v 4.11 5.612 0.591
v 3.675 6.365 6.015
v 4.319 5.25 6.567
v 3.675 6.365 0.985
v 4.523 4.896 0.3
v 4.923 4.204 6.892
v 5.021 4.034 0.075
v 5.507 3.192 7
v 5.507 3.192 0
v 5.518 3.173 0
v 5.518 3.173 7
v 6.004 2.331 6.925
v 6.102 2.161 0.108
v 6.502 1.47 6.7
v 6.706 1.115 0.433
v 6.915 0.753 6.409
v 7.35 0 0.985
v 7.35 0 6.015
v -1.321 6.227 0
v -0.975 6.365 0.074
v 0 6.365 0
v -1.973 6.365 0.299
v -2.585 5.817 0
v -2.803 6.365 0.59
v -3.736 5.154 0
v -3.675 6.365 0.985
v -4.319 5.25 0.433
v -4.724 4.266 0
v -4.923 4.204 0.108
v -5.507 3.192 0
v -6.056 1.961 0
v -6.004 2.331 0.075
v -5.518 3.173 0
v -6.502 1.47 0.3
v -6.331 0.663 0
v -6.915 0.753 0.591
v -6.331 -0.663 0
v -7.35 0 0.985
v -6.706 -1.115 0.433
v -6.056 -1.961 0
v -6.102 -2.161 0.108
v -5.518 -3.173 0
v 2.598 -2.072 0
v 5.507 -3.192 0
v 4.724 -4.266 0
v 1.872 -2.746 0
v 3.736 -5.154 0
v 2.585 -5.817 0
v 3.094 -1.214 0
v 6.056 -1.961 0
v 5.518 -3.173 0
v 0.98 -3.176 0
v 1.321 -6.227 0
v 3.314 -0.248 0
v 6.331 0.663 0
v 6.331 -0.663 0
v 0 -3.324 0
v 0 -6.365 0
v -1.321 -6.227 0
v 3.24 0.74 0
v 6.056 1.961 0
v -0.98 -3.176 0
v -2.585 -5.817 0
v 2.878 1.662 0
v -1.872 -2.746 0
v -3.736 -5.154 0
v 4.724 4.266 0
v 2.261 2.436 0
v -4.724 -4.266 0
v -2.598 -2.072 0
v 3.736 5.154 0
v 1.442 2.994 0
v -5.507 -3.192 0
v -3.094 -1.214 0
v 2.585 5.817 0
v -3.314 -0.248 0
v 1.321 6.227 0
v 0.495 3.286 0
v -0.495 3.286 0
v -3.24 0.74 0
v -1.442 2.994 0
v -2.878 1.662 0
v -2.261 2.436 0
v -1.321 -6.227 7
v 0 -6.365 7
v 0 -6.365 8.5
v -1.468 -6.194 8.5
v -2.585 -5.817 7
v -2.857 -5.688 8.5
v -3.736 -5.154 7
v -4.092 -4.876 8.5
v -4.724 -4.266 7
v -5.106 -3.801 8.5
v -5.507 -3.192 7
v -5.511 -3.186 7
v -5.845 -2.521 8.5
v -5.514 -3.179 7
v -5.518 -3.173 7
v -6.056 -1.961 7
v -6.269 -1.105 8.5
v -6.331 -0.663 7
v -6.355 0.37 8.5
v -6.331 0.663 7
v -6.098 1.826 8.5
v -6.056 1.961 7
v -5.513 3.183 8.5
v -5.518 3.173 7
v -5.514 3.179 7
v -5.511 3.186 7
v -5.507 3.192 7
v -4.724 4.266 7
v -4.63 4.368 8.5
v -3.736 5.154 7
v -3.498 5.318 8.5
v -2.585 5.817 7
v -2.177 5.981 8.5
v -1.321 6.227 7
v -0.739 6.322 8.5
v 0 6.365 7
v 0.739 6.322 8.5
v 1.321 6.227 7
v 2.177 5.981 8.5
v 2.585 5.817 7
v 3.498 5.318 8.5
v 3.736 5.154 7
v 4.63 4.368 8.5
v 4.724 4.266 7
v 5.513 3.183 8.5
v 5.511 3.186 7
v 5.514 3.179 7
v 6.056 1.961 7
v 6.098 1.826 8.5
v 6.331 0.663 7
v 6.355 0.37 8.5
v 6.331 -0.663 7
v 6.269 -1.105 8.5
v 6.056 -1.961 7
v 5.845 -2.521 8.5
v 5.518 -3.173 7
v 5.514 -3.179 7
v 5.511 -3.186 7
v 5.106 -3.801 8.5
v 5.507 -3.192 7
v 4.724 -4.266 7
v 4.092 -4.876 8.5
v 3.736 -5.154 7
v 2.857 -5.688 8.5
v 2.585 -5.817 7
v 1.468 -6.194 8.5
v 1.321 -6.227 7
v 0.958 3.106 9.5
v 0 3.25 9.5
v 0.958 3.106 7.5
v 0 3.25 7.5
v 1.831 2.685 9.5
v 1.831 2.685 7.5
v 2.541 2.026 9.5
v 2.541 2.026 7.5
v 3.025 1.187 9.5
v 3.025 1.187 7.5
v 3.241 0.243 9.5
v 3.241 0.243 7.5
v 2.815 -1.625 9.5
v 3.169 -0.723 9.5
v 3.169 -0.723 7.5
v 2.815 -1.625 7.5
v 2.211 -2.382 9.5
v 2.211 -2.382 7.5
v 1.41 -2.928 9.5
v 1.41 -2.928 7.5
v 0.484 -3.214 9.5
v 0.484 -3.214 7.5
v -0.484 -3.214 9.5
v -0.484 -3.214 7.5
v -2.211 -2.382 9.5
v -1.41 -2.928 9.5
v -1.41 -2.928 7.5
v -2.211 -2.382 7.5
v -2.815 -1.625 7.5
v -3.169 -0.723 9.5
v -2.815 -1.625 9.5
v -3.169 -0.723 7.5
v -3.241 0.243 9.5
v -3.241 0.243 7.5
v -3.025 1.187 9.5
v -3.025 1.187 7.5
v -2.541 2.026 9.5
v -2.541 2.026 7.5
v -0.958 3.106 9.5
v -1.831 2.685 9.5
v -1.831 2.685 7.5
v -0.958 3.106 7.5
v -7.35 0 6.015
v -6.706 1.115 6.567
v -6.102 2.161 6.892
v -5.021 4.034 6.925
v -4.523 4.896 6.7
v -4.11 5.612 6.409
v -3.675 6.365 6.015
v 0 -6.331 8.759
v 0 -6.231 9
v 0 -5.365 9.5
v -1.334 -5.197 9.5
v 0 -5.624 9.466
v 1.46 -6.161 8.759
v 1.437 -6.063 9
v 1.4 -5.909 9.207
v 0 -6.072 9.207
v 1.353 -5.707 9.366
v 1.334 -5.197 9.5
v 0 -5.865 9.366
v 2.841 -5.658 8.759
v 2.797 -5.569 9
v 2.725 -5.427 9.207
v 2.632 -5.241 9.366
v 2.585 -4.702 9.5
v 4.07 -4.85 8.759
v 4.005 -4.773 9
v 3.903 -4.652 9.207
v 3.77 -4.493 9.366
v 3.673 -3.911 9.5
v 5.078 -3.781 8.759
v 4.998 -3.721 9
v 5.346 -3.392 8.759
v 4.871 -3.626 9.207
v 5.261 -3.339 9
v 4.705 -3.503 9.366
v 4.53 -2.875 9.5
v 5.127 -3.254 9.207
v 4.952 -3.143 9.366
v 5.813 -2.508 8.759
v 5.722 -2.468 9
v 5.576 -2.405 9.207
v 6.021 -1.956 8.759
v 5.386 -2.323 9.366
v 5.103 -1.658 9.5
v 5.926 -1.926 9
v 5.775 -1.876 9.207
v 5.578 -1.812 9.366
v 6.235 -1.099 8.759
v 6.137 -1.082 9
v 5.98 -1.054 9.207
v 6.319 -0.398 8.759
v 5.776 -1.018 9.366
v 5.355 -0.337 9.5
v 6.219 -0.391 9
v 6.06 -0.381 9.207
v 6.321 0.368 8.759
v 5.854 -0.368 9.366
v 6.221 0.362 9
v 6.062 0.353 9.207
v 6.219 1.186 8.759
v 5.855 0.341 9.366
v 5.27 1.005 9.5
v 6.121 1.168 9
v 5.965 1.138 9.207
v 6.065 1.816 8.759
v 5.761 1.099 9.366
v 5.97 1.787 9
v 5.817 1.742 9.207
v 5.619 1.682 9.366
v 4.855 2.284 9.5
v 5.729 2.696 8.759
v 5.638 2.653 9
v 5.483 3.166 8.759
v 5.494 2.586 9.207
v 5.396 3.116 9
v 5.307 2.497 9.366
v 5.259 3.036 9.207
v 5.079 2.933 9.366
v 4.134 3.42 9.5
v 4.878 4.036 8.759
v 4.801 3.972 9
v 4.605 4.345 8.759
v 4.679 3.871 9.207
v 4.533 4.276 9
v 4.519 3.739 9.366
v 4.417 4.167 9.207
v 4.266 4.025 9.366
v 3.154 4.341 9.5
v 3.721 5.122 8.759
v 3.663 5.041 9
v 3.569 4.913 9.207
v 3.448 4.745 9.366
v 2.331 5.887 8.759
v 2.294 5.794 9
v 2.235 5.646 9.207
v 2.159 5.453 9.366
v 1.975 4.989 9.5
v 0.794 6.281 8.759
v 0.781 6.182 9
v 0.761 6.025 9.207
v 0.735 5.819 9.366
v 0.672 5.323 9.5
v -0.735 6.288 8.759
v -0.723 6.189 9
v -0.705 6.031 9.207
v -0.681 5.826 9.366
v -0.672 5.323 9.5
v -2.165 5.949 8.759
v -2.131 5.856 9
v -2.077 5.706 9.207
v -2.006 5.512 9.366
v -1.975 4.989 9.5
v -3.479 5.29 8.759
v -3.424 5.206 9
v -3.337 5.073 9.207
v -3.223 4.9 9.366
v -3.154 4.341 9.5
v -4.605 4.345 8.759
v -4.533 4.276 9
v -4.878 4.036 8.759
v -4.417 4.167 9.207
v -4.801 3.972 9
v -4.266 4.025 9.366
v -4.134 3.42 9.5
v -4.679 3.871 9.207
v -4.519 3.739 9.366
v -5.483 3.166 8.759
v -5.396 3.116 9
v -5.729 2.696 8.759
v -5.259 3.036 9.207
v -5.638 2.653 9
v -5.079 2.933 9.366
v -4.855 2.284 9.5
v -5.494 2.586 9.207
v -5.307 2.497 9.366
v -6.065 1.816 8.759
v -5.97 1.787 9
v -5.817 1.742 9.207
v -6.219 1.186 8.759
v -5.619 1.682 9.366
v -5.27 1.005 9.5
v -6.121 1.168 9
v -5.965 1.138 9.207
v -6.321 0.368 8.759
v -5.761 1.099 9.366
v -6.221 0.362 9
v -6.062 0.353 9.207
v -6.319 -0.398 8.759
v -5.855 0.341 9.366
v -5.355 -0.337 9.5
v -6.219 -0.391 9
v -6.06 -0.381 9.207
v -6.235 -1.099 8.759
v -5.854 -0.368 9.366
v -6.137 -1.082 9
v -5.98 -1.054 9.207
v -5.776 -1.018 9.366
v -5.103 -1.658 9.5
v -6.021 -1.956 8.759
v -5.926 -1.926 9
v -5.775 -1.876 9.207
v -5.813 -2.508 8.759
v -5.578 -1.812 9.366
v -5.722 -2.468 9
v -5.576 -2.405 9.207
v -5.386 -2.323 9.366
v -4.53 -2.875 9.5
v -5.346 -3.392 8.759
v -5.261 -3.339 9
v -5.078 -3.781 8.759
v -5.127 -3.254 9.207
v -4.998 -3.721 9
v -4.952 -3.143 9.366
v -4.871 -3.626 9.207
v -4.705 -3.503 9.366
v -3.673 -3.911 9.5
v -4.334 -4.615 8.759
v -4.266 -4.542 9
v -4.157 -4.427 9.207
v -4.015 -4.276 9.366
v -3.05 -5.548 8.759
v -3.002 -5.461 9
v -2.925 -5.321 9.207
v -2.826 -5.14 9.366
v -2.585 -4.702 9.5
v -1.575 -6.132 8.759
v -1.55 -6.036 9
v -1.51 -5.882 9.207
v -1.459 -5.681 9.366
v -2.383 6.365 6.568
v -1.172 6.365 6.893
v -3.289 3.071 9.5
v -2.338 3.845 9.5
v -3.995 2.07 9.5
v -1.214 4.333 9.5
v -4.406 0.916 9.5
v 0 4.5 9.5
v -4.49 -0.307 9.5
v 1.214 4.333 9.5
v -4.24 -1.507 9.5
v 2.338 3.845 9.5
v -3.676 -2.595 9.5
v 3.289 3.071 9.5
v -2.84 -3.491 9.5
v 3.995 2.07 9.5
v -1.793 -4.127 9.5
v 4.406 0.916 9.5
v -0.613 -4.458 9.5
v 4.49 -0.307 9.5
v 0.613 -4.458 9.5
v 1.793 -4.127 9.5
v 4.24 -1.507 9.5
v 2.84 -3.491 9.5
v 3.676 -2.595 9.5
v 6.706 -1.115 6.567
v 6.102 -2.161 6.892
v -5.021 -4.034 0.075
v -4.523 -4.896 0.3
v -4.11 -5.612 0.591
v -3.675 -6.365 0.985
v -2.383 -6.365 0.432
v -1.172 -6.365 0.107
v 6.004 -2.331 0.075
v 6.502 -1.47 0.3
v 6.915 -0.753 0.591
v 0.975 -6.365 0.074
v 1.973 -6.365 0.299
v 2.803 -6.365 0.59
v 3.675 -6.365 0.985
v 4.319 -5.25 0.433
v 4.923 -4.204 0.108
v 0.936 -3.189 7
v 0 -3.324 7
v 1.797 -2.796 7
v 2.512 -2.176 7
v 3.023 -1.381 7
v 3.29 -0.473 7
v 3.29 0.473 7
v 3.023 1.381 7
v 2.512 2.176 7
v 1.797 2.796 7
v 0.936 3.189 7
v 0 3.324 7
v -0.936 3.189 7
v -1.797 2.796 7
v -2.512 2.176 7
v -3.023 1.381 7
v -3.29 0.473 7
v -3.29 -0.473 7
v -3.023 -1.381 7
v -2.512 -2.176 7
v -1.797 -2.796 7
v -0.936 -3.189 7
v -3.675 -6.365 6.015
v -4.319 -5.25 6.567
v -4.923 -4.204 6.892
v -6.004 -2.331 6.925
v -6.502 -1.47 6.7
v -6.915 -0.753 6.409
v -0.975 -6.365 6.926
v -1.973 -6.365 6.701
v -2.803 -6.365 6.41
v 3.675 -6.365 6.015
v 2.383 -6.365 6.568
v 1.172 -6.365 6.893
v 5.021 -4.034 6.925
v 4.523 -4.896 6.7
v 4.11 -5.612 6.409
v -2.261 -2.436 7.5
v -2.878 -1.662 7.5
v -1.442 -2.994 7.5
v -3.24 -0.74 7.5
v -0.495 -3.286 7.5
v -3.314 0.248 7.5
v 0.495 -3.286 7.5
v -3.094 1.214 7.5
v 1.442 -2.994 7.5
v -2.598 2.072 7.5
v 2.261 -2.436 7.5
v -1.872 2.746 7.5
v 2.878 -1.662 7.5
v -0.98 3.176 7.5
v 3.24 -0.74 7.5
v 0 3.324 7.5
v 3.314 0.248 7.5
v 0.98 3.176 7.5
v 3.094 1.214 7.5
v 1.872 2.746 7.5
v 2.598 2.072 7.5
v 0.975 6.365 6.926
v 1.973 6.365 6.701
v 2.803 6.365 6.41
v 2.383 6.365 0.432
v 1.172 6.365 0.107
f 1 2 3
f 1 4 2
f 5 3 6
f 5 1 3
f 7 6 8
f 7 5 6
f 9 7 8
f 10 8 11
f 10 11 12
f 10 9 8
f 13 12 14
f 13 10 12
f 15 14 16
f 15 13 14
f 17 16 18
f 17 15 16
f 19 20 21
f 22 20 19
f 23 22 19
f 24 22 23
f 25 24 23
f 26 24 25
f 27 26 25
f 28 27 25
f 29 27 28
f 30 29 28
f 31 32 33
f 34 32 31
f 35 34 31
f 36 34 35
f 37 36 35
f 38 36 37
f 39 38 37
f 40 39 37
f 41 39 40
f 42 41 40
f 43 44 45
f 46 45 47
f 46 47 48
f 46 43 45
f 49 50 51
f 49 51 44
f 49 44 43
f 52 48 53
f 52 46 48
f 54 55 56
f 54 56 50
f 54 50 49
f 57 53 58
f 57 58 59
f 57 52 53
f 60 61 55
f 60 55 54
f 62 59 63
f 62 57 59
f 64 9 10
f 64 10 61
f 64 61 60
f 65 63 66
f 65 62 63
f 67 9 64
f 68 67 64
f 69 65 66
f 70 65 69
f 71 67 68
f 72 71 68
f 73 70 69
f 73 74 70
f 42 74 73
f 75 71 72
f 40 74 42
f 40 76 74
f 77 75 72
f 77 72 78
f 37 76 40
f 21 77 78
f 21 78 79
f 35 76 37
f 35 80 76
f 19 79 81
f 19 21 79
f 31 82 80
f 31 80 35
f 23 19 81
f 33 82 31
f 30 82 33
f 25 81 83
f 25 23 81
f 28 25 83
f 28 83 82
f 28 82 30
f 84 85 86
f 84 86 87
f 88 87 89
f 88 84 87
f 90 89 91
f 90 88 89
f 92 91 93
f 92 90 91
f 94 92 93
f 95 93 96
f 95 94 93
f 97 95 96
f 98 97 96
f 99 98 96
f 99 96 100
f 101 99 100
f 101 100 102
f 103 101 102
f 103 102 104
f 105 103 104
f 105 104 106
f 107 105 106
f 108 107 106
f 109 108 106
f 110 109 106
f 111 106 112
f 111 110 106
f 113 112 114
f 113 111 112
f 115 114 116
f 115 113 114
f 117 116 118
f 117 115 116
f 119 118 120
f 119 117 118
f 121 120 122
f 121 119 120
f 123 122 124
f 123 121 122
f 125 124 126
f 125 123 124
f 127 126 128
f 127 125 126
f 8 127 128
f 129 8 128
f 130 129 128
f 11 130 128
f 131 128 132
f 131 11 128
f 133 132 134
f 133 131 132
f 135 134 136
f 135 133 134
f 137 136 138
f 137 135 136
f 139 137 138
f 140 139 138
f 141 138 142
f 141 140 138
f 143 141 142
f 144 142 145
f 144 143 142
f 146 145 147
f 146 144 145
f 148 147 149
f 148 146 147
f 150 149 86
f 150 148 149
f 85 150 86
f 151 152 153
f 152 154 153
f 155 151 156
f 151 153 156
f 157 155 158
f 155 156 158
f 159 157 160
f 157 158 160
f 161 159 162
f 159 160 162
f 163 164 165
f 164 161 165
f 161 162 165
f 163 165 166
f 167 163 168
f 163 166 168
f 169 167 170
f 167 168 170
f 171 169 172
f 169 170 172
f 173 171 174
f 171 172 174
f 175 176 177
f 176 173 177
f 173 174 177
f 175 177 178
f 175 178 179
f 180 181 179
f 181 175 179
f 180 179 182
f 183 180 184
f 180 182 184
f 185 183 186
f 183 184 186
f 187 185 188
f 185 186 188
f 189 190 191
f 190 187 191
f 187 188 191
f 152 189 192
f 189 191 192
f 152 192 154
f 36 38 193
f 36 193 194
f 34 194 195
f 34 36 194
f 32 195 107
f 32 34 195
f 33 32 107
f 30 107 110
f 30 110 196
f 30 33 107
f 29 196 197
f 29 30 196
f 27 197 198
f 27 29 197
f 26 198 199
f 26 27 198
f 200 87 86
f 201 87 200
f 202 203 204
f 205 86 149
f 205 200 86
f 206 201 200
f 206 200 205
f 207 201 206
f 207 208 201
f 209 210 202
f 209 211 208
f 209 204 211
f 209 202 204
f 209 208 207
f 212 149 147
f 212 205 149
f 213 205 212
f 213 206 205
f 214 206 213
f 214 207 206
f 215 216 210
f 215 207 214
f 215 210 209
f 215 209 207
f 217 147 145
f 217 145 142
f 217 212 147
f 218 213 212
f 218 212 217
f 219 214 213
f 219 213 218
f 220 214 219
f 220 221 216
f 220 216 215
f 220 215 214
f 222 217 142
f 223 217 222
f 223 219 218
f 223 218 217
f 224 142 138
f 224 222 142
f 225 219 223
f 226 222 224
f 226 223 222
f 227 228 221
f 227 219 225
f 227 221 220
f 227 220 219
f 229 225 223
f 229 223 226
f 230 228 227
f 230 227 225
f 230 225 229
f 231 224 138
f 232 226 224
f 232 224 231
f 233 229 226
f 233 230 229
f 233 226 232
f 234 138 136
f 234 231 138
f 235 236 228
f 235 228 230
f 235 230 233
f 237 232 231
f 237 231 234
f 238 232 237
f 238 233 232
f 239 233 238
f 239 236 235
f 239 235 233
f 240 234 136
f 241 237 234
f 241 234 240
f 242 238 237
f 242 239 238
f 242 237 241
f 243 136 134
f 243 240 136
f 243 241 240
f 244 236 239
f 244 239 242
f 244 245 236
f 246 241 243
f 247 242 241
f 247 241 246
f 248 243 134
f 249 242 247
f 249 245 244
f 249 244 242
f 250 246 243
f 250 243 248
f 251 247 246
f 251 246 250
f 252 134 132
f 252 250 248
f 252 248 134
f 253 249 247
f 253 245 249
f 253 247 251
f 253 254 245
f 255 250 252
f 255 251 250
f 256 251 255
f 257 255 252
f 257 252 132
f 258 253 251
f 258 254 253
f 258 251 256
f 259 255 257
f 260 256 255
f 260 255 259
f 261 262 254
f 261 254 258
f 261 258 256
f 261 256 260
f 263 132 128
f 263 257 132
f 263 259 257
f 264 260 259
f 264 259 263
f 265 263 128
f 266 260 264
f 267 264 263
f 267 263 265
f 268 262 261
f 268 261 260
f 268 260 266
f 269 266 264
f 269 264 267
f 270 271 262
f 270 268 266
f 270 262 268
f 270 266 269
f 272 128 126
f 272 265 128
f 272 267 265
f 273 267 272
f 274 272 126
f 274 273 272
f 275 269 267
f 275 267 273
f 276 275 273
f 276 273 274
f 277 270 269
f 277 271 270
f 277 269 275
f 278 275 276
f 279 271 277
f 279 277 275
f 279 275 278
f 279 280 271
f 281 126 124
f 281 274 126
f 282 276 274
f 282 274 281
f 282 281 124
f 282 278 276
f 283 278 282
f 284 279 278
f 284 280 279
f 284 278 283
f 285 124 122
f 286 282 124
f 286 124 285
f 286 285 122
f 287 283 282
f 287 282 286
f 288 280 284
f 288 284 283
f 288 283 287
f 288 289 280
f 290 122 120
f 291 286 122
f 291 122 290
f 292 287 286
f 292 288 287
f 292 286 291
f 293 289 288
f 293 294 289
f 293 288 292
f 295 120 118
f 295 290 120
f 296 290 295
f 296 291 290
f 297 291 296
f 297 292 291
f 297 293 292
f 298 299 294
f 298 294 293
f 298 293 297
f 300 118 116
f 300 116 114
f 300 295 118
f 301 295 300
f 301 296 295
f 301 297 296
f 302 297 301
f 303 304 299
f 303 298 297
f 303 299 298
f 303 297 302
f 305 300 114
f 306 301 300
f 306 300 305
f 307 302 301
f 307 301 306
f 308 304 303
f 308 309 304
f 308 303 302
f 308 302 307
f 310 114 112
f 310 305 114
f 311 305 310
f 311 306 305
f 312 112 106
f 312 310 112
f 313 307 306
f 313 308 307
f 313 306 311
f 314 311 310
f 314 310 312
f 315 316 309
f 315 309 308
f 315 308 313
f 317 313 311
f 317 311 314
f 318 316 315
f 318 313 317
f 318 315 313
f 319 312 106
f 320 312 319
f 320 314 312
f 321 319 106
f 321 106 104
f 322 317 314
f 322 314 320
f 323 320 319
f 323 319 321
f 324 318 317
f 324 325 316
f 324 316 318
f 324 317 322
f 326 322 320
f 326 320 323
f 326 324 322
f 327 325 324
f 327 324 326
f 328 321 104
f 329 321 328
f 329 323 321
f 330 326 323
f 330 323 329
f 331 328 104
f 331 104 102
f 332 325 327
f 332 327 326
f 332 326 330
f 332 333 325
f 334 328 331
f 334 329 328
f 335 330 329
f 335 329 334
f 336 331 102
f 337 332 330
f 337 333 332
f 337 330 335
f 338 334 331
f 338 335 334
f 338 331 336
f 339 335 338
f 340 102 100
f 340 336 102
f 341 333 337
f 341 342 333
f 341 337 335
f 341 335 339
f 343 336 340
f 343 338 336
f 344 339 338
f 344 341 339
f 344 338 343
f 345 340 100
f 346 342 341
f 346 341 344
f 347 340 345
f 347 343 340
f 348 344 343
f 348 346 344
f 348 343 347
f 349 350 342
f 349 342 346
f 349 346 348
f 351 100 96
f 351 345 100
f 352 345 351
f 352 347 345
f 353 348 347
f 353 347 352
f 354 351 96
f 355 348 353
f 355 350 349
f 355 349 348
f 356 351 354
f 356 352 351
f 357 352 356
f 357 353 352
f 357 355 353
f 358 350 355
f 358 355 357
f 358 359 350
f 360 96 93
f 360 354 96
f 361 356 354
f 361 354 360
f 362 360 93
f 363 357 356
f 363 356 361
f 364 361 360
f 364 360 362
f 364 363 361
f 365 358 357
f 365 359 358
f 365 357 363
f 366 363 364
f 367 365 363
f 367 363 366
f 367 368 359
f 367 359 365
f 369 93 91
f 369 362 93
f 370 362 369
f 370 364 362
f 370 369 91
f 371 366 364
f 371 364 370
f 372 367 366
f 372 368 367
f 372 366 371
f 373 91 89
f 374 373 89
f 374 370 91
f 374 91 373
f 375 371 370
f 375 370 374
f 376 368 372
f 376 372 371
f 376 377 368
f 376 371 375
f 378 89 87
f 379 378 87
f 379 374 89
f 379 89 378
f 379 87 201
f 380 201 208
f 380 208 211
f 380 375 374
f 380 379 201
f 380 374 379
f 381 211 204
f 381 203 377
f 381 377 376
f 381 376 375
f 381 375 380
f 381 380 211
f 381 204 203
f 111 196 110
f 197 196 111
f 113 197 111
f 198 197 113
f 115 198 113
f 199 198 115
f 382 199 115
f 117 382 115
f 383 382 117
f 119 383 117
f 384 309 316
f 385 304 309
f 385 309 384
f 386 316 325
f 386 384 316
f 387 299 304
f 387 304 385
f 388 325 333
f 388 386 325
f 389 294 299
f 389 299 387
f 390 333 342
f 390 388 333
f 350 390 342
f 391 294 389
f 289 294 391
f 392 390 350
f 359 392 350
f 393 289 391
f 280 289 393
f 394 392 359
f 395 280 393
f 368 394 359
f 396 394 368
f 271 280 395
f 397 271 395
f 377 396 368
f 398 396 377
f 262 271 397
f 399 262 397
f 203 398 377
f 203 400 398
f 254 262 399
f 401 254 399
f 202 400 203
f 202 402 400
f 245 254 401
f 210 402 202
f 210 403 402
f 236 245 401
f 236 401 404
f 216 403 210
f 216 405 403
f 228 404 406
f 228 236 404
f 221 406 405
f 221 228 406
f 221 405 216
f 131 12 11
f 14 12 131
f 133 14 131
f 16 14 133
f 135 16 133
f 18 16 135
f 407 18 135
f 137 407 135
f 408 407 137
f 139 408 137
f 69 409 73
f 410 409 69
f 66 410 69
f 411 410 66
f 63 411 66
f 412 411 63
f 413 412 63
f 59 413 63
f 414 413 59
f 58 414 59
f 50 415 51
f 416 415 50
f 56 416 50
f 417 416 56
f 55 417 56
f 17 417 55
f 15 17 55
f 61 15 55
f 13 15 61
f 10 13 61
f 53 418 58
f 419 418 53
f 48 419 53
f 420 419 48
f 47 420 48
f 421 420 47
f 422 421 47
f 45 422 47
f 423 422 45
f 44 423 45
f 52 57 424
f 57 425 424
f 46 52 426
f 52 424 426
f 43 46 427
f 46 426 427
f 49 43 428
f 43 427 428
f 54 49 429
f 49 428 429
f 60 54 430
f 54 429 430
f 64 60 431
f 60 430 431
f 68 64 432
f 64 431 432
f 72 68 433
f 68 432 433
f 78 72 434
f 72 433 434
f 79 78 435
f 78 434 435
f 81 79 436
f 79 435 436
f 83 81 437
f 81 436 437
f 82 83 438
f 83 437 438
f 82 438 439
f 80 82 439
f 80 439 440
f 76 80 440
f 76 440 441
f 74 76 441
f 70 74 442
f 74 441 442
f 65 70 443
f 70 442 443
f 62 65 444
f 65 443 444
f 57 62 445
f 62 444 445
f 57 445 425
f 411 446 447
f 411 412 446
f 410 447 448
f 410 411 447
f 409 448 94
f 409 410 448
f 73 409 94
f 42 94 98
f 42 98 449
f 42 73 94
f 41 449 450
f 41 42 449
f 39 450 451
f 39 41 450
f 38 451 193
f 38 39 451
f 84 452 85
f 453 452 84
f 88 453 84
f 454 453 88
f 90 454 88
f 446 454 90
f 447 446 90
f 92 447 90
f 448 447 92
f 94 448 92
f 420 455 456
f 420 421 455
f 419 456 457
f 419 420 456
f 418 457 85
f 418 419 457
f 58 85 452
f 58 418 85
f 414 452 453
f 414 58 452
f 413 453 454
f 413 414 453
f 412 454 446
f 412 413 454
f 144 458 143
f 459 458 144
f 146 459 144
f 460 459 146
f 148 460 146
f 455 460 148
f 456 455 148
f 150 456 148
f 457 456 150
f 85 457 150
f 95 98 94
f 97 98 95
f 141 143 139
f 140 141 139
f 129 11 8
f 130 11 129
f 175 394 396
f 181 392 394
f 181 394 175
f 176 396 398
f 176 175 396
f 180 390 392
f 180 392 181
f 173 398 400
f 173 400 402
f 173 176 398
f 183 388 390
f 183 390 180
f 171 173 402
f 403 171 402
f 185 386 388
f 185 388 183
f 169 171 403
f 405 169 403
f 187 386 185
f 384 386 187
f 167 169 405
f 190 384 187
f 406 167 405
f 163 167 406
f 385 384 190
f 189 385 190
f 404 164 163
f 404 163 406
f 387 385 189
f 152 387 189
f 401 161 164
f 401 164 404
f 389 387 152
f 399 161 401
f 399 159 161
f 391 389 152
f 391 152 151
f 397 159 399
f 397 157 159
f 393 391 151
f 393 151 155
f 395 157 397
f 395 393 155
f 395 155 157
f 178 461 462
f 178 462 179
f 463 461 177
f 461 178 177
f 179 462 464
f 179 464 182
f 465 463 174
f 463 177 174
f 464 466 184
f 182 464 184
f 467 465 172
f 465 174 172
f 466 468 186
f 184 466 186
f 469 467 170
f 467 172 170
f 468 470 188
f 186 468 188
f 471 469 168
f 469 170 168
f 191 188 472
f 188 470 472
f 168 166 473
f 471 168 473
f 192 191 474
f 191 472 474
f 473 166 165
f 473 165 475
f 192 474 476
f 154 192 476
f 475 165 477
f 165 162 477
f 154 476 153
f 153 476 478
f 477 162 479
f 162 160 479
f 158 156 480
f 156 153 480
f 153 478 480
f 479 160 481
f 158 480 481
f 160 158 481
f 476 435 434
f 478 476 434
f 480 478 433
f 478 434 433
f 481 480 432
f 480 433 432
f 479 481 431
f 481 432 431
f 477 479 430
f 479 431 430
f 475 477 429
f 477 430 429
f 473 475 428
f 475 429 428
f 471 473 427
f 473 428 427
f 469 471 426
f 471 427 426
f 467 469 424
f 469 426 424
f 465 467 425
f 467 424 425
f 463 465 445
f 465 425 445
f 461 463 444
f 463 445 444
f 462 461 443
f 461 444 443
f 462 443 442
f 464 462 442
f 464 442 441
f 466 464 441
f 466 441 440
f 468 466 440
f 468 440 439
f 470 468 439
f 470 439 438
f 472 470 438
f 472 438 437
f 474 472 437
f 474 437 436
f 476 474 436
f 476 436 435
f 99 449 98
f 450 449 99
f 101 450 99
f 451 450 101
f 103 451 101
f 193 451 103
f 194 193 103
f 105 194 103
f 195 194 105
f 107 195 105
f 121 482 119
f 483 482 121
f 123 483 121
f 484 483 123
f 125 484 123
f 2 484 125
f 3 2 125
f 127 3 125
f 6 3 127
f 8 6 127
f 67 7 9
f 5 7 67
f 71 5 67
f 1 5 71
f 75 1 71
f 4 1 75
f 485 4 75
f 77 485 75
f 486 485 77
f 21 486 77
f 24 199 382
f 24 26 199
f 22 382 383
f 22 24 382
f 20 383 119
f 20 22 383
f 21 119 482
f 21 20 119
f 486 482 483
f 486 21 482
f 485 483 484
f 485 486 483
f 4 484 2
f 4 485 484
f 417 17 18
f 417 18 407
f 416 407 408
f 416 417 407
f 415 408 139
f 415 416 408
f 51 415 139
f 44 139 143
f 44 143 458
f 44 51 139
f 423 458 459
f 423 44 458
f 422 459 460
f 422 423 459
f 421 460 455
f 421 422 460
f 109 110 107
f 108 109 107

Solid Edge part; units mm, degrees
sketch "Sketch1" plane through (0, 0, 0) normal (0, 0, 1) x (1, 0, 0)
  line L0 (-3.675, 6.3653) -> (3.675, 6.3653)
  line L1 (3.675, 6.3653) -> (7.35, 0)
  line L2 (7.35, 0) -> (3.675, -6.3653)
  line L3 (3.675, -6.3653) -> (-3.675, -6.3653)
  line L4 (-3.675, -6.3653) -> (-7.35, 0)
  line L5 (-7.35, 0) -> (-3.675, 6.3653)
extrude "Protrusion1" add sketch "Sketch1" along normal blind 7
sketch "Sketch2" plane through (0, -5.5125, 6.3) normal (-1, 0, 0) x (0, 1, 0)
  line L0 (-2.267, 4.8858) -> (0.5614, 7.7142)
  line L1 (-2.267, 4.8858) -> (-2.267, 0.7142)
  line L2 (-2.267, 0.7142) -> (0.5614, -2.1142)
revolve "RevolvedCutout1" cut sketch "Sketch2" angle 360 about axis through (0, 0, 0.5943) along (0, 0, -1) material side at (0, -6.4007, -0.0354)
sketch "Sketch3" plane through (0, 0, 0) normal (1, 0, 0) x (0, 1, 0)
  line L0 (0, 9.5) -> (-5.3653, 9.5)
  arc A0 (-6.3653, 8.5) -> (-5.3653, 9.5) centre (-5.3653, 8.5) cw
  line L1 (-6.3653, 8.5) -> (-6.3653, 7)
  line L2 (-6.3653, 7) -> (0, 7)
  line L3 (0, 7) -> (0, 9.5)
  dimension "D1" = 9.5
revolve "RevolvedProtrusion1" add sketch "Sketch3" angle 360 about axis through (0, 0, -57) along (0, 0, 1)
hole "Hole_1" at (0, 0, 7) direction (0, 0, 1) diameter 6.647 end up to next both ways yes
sketch "Sketch4" plane through (0, 0, 9.5) normal (0, 0, 1) x (0, 1, 0)
  circle A0 centre (0, 0) radius 4.5
extrude "ExtrudedCutout_2" cut sketch "Sketch4" against normal blind 2
sketch "Sketch5" plane through (0, 0, 7.5) normal (0, 0, 1) x (0, 1, 0)
  circle A0 centre (0, 0) radius 4.5
  circle A1 centre (0, 0) radius 3.25
  dimension "D1" = 6.5
extrude "Protrusion2" add sketch "Sketch5" along normal up to vertex (2 mm away)
